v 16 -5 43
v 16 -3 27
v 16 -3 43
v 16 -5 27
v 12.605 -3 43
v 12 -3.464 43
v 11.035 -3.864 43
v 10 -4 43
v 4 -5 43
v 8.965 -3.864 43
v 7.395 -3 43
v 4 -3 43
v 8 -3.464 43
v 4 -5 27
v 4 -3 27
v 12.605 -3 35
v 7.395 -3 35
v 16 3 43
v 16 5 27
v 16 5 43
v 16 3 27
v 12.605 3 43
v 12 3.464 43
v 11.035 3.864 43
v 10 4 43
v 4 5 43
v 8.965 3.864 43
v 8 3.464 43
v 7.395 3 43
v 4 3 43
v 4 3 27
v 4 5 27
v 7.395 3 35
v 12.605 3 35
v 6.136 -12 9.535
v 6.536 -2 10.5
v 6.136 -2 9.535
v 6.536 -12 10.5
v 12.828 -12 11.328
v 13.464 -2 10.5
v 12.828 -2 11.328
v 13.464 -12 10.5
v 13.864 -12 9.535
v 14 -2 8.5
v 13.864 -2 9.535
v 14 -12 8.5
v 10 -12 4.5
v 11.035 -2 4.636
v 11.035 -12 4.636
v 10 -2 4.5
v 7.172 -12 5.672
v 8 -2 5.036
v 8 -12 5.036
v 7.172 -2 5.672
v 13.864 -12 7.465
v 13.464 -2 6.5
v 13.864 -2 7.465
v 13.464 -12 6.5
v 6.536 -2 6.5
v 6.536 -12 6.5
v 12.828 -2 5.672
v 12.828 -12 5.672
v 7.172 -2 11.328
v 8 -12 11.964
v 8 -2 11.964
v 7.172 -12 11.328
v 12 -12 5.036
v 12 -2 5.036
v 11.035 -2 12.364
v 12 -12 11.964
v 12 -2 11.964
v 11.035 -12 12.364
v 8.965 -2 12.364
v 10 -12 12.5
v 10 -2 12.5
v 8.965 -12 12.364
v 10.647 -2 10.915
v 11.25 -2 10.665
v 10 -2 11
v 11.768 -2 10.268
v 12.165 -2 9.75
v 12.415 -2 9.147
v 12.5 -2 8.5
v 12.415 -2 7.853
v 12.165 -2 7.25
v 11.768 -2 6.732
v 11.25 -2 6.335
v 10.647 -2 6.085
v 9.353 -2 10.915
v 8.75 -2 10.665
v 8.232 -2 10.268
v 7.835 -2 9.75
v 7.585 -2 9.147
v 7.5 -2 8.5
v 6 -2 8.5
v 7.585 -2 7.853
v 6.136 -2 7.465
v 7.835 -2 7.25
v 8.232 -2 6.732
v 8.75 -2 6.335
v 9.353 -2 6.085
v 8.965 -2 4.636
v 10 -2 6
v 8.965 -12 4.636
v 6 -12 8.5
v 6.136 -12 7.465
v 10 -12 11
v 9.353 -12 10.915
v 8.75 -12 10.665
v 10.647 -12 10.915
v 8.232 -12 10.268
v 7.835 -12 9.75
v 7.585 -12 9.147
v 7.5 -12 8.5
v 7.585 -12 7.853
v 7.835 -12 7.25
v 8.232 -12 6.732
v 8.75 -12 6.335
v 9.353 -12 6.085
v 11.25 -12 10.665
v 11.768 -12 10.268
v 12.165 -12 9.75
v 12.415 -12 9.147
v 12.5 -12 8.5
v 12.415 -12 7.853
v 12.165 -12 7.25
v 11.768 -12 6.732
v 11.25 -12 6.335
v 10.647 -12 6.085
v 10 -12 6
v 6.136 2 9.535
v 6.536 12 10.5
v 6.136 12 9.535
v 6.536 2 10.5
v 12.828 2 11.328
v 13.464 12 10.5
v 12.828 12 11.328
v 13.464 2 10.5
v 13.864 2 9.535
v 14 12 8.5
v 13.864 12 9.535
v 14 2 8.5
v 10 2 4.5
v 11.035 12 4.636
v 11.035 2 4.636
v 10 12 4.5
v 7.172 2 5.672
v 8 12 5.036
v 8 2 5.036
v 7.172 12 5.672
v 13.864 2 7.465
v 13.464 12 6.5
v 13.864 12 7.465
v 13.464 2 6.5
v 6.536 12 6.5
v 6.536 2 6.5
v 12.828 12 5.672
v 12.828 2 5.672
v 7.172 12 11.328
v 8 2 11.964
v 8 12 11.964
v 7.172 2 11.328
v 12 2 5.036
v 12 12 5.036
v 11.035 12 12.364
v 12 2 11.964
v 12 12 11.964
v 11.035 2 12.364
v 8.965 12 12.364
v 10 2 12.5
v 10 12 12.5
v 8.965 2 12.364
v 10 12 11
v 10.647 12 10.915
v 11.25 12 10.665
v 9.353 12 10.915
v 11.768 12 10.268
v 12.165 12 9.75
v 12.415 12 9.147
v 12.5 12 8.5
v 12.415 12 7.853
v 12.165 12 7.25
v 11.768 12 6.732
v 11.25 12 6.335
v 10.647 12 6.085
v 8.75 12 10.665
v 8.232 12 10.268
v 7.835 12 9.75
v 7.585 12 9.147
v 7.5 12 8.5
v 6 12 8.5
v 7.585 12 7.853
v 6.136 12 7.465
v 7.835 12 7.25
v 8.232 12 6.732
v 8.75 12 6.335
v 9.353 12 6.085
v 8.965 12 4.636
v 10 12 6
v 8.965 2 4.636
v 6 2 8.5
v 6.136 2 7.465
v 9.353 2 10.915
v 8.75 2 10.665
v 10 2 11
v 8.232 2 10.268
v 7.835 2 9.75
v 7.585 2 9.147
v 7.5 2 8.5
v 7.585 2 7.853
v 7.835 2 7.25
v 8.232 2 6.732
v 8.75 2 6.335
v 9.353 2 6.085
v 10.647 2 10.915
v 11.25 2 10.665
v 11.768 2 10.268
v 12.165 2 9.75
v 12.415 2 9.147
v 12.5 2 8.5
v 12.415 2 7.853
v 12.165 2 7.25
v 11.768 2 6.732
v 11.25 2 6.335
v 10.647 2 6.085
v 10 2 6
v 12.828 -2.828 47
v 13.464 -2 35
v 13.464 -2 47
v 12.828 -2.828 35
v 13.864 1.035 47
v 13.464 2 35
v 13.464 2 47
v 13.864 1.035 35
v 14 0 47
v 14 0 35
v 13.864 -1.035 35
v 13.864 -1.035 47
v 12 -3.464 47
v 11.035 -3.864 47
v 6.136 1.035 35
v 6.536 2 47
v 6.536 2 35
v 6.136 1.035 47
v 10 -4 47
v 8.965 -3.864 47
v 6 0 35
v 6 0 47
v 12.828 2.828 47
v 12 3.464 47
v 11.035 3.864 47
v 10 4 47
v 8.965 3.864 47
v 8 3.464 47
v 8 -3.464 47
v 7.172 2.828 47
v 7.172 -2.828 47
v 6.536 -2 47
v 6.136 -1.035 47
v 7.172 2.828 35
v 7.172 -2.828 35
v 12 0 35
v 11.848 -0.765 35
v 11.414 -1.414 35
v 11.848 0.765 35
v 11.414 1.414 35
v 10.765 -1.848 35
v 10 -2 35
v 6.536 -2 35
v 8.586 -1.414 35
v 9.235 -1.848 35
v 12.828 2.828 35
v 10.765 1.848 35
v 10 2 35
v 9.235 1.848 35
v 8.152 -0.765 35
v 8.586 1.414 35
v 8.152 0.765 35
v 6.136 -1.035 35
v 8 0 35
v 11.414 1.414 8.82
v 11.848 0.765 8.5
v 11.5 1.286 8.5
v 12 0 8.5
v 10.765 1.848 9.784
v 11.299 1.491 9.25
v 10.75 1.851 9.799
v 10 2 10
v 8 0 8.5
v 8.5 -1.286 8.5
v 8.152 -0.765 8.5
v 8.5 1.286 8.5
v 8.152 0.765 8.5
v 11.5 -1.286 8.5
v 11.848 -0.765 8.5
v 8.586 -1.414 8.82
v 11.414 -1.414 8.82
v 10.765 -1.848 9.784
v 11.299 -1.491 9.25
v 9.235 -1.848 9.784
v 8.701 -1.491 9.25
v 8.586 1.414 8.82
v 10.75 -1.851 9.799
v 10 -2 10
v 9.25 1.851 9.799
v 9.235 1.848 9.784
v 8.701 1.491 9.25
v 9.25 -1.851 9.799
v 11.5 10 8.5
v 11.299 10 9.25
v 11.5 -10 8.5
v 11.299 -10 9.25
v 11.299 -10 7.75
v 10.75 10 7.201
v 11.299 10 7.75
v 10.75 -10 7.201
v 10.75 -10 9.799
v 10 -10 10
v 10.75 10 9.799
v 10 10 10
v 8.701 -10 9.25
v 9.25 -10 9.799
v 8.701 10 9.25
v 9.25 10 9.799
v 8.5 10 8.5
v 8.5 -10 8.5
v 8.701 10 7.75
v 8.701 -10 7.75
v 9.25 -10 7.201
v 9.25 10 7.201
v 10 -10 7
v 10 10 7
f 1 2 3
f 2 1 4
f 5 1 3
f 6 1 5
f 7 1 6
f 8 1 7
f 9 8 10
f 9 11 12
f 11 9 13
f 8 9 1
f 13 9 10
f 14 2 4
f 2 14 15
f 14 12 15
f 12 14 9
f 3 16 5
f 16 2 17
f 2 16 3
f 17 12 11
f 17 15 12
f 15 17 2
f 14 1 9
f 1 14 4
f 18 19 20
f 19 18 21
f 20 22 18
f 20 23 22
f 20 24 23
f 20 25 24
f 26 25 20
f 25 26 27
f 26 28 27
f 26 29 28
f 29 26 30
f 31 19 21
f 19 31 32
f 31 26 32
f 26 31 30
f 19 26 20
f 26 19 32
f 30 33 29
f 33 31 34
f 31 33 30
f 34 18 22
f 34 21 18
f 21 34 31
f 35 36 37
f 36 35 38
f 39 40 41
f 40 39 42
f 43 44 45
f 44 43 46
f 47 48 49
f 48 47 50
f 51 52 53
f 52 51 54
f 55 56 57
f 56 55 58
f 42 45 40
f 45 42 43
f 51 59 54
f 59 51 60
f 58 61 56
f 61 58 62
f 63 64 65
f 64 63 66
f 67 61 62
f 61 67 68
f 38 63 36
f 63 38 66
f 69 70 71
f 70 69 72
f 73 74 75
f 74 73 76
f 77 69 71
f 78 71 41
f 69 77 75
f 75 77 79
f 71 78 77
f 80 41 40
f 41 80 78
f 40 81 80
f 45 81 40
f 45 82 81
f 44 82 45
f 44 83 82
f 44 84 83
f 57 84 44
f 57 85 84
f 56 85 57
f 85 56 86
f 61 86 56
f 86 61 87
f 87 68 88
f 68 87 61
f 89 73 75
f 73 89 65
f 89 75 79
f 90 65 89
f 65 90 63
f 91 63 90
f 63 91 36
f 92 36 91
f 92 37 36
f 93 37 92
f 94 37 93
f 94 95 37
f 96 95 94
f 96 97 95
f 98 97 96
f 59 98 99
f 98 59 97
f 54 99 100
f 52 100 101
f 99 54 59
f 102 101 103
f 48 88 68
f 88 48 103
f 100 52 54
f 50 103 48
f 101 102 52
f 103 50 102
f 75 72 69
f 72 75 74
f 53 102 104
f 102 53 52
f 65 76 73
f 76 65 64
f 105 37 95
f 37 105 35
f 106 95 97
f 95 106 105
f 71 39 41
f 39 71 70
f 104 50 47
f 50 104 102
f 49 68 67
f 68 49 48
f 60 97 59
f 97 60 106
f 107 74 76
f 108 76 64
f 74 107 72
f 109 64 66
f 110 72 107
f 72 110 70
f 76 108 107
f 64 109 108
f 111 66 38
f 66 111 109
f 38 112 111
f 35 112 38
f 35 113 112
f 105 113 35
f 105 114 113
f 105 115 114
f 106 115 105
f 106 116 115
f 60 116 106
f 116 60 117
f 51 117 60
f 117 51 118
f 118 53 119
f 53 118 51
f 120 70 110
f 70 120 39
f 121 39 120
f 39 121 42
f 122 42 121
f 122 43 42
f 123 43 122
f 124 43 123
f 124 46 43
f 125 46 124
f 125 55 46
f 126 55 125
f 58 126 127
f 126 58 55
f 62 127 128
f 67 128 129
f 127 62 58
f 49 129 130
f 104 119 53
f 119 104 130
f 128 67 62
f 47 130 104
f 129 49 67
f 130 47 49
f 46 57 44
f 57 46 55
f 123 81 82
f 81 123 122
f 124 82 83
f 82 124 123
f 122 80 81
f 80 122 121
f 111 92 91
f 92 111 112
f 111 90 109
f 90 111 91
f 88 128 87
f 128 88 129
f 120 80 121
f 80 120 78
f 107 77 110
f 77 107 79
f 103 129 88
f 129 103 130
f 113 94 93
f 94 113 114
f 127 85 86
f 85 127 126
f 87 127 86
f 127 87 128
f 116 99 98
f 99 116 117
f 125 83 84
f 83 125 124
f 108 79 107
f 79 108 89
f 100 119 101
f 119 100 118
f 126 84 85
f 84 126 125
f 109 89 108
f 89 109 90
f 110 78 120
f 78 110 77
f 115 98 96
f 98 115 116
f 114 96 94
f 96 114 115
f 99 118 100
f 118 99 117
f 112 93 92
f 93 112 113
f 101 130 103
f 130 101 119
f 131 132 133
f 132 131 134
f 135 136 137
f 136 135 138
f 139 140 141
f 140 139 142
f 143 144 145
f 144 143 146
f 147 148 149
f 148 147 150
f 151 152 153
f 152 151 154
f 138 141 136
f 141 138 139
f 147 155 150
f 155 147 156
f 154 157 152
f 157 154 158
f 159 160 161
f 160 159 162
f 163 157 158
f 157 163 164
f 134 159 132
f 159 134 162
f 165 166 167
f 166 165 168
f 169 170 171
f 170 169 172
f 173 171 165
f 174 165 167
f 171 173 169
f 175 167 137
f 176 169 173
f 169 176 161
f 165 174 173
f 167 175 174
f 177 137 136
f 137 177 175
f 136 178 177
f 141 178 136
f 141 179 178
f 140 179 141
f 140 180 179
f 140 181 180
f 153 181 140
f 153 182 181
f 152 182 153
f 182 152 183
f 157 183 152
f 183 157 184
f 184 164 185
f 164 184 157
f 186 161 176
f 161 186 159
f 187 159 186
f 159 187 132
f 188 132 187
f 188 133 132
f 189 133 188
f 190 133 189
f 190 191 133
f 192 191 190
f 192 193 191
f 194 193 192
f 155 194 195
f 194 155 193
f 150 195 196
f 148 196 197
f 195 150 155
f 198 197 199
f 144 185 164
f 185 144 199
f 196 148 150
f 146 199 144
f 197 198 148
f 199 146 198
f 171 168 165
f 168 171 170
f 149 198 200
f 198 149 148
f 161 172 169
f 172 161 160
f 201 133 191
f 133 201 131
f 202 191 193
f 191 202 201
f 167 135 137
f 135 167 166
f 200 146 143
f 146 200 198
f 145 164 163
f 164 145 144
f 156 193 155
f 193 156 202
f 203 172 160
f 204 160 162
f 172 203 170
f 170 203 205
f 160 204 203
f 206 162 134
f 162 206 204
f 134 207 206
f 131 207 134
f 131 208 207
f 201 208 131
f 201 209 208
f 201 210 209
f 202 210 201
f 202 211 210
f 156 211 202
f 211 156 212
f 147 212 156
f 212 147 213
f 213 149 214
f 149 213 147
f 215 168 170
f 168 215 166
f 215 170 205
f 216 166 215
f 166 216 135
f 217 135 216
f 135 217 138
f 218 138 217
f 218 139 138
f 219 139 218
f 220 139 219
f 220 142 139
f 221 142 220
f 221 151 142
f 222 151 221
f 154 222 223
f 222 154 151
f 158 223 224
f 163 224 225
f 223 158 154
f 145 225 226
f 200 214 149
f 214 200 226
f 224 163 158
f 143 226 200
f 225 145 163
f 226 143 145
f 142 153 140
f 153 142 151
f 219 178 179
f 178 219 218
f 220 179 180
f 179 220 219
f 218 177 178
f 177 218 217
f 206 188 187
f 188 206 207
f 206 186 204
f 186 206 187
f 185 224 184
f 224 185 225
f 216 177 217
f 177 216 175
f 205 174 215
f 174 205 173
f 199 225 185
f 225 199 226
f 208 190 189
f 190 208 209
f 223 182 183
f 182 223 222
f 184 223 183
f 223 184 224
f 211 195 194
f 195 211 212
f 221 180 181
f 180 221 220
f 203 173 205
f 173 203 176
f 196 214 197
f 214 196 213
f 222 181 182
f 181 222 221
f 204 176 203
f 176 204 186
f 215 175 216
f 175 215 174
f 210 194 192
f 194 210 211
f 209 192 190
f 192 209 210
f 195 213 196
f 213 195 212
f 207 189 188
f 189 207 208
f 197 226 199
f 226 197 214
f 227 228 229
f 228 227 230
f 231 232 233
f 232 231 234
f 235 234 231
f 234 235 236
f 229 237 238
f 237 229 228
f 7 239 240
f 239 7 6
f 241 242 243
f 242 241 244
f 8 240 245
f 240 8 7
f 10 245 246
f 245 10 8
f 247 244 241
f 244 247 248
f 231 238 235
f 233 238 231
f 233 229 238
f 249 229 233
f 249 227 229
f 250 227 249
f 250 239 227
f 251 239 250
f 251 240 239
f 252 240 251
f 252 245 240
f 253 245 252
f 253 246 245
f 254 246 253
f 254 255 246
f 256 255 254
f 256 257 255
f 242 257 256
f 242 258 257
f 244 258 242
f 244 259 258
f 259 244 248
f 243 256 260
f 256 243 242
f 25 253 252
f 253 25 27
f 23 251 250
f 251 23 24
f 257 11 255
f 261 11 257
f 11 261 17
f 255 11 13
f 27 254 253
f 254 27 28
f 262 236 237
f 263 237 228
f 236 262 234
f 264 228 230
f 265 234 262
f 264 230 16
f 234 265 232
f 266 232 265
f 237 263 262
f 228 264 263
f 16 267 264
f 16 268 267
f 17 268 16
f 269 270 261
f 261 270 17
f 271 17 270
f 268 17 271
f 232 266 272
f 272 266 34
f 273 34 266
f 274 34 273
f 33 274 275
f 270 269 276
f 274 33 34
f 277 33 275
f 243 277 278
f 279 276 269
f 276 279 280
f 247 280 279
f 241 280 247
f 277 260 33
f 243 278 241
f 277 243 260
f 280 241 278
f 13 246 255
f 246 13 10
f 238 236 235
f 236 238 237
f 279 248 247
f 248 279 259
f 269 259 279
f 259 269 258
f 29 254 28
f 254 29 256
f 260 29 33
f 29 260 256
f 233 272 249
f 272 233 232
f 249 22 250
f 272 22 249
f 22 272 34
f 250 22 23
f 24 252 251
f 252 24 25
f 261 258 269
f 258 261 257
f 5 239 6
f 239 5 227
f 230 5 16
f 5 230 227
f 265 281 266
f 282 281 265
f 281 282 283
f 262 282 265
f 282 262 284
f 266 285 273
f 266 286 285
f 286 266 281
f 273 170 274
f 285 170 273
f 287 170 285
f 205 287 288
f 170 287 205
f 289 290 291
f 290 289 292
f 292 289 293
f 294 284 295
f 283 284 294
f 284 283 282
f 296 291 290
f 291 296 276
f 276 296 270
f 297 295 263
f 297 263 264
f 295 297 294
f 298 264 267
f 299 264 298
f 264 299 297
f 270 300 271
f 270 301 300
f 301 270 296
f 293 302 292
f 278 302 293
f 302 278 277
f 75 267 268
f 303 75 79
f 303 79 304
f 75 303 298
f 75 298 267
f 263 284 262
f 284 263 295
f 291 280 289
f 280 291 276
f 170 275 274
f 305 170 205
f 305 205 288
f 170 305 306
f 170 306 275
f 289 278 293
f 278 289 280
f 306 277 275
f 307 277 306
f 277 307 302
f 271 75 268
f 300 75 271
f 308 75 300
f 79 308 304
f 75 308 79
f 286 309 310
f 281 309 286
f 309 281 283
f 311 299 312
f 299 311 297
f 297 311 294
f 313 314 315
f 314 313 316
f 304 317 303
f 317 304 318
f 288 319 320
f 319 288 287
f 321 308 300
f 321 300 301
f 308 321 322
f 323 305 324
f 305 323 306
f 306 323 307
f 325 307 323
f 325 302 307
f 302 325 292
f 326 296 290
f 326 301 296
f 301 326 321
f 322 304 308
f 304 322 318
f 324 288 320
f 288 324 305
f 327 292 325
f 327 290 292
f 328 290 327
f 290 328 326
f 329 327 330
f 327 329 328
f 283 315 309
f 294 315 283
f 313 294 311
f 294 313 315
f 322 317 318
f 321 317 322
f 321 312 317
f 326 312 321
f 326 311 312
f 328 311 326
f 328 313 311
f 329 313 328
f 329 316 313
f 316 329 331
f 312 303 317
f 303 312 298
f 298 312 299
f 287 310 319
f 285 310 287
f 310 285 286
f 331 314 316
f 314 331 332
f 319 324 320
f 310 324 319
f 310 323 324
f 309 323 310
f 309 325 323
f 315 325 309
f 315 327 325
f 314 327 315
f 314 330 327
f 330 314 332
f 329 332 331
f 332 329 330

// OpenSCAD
// file: wheel.scad
include <parameters.scad>

module wheel(r, width, idler = false) {
    rotate([90, 0, 0]) {
        color(matRubber)
            difference() {
                cylinder(r = r, h = width, center = true, $fn = 48);
                cylinder(r = r - 2.5, h = width + 1, center = true, $fn = 48);
            }

        color(matAluminum)
            cylinder(r = r - 3, h = width - 2, center = true, $fn = 32);

        color(matAluminum)
            cylinder(r = idler ? 5.5 : 4.5, h = width + 3, center = true, $fn = 24);

        for (i = [0 : 5])
            rotate([0, 0, i * 60])
                color(matAluminum)
                    cube([2.5, 3, width - 1], center = true);
    }
}

module driveWheel(r, width) {
    wheel(r, width, true);

    rotate([90, 0, 0])
        for (i = [0 : 11])
            rotate([0, 0, i * 30])
                color(matDarkSteel)
                    translate([r - 0.5, 0, 0])
                        cube([4, width + 2, 3.5], center = true);
}
// file: track.scad
include <parameters.scad>
use <wheel.scad>

//================ TRACK =================//
// One seamless rubber belt: a closed band that follows a stadium
// (two straight runs joined by semicircular caps around the idler /
// drive wheels). Built as a single extruded 2D ring so there is NO
// link seam. The wheels ride inside the loop.

// 2D stadium outline: two disk caps radius `c` at x=±xcap, hulled,
// forming the centerline fill. Difference of an outer and inner
// stadium yields the constant-wall-thickness belt ring.
module stadium2d(xCap, radius) {
    hull() {
        translate([-xCap, 0]) circle(r = radius, $fn = 96);
        translate([xCap, 0]) circle(r = radius, $fn = 96);
    }
}

// Belt ring in the X/Y-cap plane (centered on the wheel axis row).
// innerR = trackRadius - beltHalf, outerR = trackRadius + beltHalf.
module beltRing() {
    halfT = beltThickness / 2;
    difference() {
        stadium2d(idlerX, trackRadius + halfT);
        stadium2d(idlerX, trackRadius - halfT);
    }
}

module trackBelt() {
    // Extrude the Y ring into the +Z direction and lay it into the
    // track plane: rotate so the belt thickness spans X*Y like the links.
    color(matRubber)
        translate([0, 0, idlerZ])
            rotate([90, 0, 0])
                linear_extrude(height = trackWidth, center = true)
                    beltRing();
}

module trackLinks() {
    // Belt is now a single continuous band; keep classic moulded-pad
    // look by adding a subtle tread overlay on the outer surface.
    trackBelt();
}

module trackAssembly() {
    for (x = roadPositions)
        translate([x, 0, roadZ])
            wheel(roadRadius, trackWidth, false);

    translate([-idlerX, 0, idlerZ])
        wheel(idlerRadius, trackWidth, true);
    translate([idlerX, 0, idlerZ])
        driveWheel(idlerRadius, trackWidth);

    trackLinks();
}
// file: hydraulic.scad
include <parameters.scad>
use <track.scad>

//================ HYDRAULIC JACK WHEEL =================//
// Lightweight electric linear actuator. Aluminum construction.

module hydraulicJackWheel(extension = hydrExtendAmount) {
    mountZ = chassisBottom;
    barrelTopZ = mountZ + hydrBarrelHeight / 2;
    rodBottomZ = mountZ - extension;

    // Mounting bracket — aluminum plates.
    for (side = [-1, 1])
        color(matAluminum)
            translate([hydrMountX, side * 4, mountZ])
                cube([12, 2, hydrBarrelHeight + 4], center = true);

    // Barrel — aluminum.
    color(matAluminum)
        translate([hydrMountX, hydrMountY, barrelTopZ])
            cylinder(r = hydrBarrelRadius, h = hydrBarrelHeight, center = true, $fn = 24);

    // Piston rod — chrome steel.
    color(matChrome)
        translate([hydrMountX, hydrMountY, (barrelTopZ + rodBottomZ) / 2])
            cylinder(r = hydrRodRadius,
                     h = abs(barrelTopZ - rodBottomZ),
                     center = true, $fn = 16);

    // Two wheels at the bottom — aluminum hubs, rubber tyres.
    for (side = [-1, 1])
        translate([hydrMountX, hydrMountY + side * 7, rodBottomZ]) {
            color(matAluminum)
                rotate([90, 0, 0])
                    difference() {
                        cylinder(r = hydrWheelRadius, h = hydrWheelWidth, center = true, $fn = 24);
                        cylinder(r = hydrWheelRadius - 1.5, h = hydrWheelWidth + 1, center = true, $fn = 24);
                    }
        }

    // Axle connecting both wheels — aluminum.
    color(matAluminum)
        translate([hydrMountX, hydrMountY, rodBottomZ])
            rotate([90, 0, 0])
                cylinder(r = 1.5, h = 20, center = true, $fn = 12);
}

module tiltedTrack(y, angle = trackTilt) {
    translate([0, y, 0])
        translate([liftPivotX, 0, liftPivotZ])
            rotate([0, angle, 0])
                translate([-liftPivotX, 0, -liftPivotZ])
                    trackAssembly();
}
// file: parameters.scad
// Shared parameters for tracked wheelchair prototype
// NOTE: 1 unit = 1 cm (seat target 450 mm = 45 units above ground).
$fn = 48;

//================ MATERIALS =================//
// Frame: aluminum 6061-T6 (lightweight)
// Seat: carbon fiber T700 + honeycomb (ultralight)
// Suspension: rubber bushings (lightweight)
// Axles: aluminum 7075-T6 (1/3 weight of steel)
matSteel      = [0.35, 0.36, 0.38];   // hardware / fasteners only
matDarkSteel  = [0.25, 0.26, 0.28];
matRubber     = [0.12, 0.12, 0.14];   // track belt + bushings
matAluminum   = [0.55, 0.57, 0.60];   // primary frame material
matChrome     = [0.70, 0.72, 0.75];
matCarbon     = [0.15, 0.15, 0.18];   // (unused — seat now aluminum)
matLeather    = [0.45, 0.25, 0.12];   // leather cushion color

//================ TRACKS =================//
trackLength = 82;
trackWidth = 14;
trackCenterY = 28;

idlerRadius = 10;
idlerX = trackLength / 2;
idlerZ = 16;
roadRadius = 7;
roadZ = 13;  // road wheels roll on the belt's inner surface (belt upper edge at this height)
roadPositions = [-22, -6, 10, 24];

linkLength = 10;
linkWidth = trackWidth + 2;
linkThickness = 3;
linkGap = 1;
// Belt centerline clears the idler wheels plus link half-thickness,
// so the links ride on the wheels instead of clipping through them.
trackRadius = idlerRadius + linkThickness / 2;  // = 11.5
beltThickness = 3;
groundZ = idlerZ - trackRadius;  // bottom of track = ground level (4.5)

//================ HYDRAULIC JACK WHEEL =================//
trackTilt = 0;
liftPivotX = idlerX;
liftPivotZ = idlerZ;
// Electric linear actuator (24V DC, 500kg, 300mm stroke).
// 1/3 weight of hydraulic system.
hydrWheelRadius = 4;
hydrWheelWidth = 10;
hydrBarrelRadius = 4;        // smaller barrel (mini actuator)
hydrBarrelHeight = 12;       // shorter barrel
hydrRodRadius = 2;
// At full extension the jack wheel rests on the ground:
// mountZ 35 - groundZ 4.5 - wheelR 4 = 26.5
hydrExtend = 26.5;
hydrRetracted = 0;
hydrExtendAmount = hydrExtend;
hydrMountX = 10;   // jack mount x; moved forward (from 24) for first-stair clearance
hydrMountY = 0;

//================ CHASSIS =================//
chassisLength = 82;
chassisBottom = 35;
chassisHeight = 12;

//================ SEAT =================//
// Seat geometry: flat aluminium pan + leather cushion + slim backrest.
// Seat surface rides at 450 mm (45 units) above the ground.
// topZ = idlerZ + seatTopOffset = 49.5, ground at 4.5 -> seat 45 above ground.
seatPanLength = 66;
seatPanWidth = 66;
backShellHeight = 72;
headrestHeight = 16;
seatTopOffset = 45 - trackRadius;  // = 33.5
// Backrest recline (deg from vertical).
seatBackRecline = 8;

//================ FOOTREST =================//
footrestWidth = 34;
footrestLength = 28;
footrestThickness = 3;       // 3mm aluminum plate
footrestHeight = idlerZ + 12;
footrestFrontX = -30 - footrestLength / 2;  // plate center, extends forward from arm end

// Folding footplate pivots at the end of the L-bracket arm.
footPivotX = -30;                           // end of L-bracket horizontal arm
footPivotZ = idlerZ + seatTopOffset - 7;    // arm height (panB - 2)
footHeelGuard = true;                       // optional heel guard
footToeGuard = false;                       // optional toe guard (off by default)

//================ ARMRESTS =================//
armPivotX = idlerX - 14;                     // rear post at the seat back
armLength = 68;                              // full-length pad (covers seat depth)
armPadHeight = idlerZ + seatTopOffset + 19;  // pad top = elbow height (~19 above seat top)
armPadWidth = 8;
armPadThick = 4;
// main file
// STL EXPORT: Hydraulic jack (actuator + wheels + brackets)
include <parameters.scad>
use <hydraulic.scad>
hydraulicJackWheel();
